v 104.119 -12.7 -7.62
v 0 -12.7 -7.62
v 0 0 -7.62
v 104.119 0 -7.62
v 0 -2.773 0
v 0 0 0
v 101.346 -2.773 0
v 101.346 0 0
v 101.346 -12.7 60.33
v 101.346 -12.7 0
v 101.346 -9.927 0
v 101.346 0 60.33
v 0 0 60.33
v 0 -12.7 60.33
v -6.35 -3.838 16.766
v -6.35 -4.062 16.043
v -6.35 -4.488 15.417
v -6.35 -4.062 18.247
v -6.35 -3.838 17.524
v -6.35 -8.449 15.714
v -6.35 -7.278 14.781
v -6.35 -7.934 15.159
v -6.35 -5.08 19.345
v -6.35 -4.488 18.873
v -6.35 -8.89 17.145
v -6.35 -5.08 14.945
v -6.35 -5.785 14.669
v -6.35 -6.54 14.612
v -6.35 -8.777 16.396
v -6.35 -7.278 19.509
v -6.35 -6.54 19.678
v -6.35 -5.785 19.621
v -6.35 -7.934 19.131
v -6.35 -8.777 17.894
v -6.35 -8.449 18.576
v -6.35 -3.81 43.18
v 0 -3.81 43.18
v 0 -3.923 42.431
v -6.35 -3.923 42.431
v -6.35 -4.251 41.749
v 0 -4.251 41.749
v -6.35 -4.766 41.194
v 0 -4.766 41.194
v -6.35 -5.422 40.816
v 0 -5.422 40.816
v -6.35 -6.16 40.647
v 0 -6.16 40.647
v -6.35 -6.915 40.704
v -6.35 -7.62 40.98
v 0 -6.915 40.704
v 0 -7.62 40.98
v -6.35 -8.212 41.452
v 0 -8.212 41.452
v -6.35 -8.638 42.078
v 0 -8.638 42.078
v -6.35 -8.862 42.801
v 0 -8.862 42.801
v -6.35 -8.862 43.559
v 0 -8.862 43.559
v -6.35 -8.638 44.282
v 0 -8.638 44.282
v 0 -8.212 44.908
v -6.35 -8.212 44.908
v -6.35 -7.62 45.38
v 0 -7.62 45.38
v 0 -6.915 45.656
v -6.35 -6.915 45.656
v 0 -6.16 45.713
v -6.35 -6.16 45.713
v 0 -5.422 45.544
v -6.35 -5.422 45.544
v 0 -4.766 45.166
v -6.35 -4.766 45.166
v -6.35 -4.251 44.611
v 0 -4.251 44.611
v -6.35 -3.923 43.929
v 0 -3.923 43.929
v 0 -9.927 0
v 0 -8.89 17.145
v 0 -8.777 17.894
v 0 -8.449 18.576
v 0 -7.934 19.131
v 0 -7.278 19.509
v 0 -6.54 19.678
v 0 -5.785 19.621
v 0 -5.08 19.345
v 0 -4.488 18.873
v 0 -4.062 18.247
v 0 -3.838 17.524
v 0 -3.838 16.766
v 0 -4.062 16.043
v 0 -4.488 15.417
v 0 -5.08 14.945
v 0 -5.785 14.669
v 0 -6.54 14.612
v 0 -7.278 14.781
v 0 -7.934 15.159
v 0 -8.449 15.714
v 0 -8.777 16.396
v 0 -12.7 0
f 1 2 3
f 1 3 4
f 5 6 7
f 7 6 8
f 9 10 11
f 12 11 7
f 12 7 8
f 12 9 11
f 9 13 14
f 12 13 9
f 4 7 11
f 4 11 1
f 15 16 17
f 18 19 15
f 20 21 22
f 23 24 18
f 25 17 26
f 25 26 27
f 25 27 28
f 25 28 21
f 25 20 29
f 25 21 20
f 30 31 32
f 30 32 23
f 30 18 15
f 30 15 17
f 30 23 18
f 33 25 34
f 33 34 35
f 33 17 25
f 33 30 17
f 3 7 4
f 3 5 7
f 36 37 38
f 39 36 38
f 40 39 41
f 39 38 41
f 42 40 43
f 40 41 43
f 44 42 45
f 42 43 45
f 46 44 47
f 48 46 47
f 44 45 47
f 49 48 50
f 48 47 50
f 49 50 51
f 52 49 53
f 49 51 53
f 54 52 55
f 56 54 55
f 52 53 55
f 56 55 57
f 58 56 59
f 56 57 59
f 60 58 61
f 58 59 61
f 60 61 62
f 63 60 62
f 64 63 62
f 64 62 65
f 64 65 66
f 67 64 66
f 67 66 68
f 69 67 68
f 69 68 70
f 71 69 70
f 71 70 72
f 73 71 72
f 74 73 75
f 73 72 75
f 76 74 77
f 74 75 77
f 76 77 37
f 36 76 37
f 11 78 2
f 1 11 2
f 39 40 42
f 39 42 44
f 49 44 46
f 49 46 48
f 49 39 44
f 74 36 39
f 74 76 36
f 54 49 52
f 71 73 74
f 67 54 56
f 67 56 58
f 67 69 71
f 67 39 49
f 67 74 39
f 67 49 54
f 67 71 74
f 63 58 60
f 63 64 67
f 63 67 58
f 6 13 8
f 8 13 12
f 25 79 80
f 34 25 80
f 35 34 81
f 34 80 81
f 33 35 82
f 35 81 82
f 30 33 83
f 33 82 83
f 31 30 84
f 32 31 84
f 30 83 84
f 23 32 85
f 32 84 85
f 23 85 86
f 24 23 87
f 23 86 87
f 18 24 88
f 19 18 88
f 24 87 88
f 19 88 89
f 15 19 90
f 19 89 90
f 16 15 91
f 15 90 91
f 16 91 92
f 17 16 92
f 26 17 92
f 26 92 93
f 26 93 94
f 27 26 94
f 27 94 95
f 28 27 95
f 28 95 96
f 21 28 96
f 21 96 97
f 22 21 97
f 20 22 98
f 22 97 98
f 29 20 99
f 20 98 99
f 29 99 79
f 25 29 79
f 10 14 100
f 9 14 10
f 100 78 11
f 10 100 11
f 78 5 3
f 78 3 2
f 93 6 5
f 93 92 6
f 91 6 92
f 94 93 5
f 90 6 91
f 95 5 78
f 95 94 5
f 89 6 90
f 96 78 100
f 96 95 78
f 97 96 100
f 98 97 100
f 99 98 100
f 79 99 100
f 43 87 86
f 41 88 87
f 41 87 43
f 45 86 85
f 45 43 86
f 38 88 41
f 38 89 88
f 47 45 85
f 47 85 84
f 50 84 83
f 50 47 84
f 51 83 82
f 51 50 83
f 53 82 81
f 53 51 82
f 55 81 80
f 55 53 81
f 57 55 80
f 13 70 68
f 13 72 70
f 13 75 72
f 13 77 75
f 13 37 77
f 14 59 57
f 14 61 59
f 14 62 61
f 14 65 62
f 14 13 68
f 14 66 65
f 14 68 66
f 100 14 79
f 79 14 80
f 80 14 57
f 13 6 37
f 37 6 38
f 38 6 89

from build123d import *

# Parameters (mm, degrees)
F0_W      = 101.6
F0_H      = 60.33
F1_DEPTH  = 12.7
F3_DEPTH  = 101.6
F4_W      = 13.7607939541
F4_H      = 10.2049419656
F5_DEPTH  = 3.175
F6_DEPTH  = 3.175
F7_W      = 0.254
F7_H      = 12.7
F8_DEPTH  = 101.6
F10_DEPTH = 25.4
F11_W     = 0.7027839153
F11_H     = 7.62
F14_W     = 24.6972160847
F14_H     = 5.7475257993
F15_DEPTH = 7.62
F17_DEPTH = 6.35


with BuildPart() as f1:
    # F0 (on Front) → F1 (new body)
    with BuildSketch(Plane.XZ):
        with Locations((50.8, 30.165)):
            Rectangle(F0_W, F0_H)
    extrude(amount=F1_DEPTH)

    # F2 (on face) → F3 (join)
    with BuildSketch(Plane.YZ.offset(101.6)):
        Polygon((0, -7.62), (-2.7734531851, 0), (-9.9265468149, 0), (-12.7, -7.62), align=None)
    extrude(amount=-F3_DEPTH)

    # F4 (on face) → F5 (cut)
    with BuildSketch(Plane(origin=(0, 0, 0), x_dir=(0, -1, 0), z_dir=(-1, 0, 0))):
        with Locations((6.8803969771, -5.1024709828)):
            Rectangle(F4_W, F4_H)
    extrude(amount=-F5_DEPTH, mode=Mode.SUBTRACT)

    # F6 (add): a face of the model
    f6_faces = [f1.faces().sort_by_distance(p)[0] for p in [
        (3.175, -6.35, -4.1648349301),
    ]]
    extrude(f6_faces, amount=F6_DEPTH)

    # F7 (on face) → F8 (cut)
    with BuildSketch(Plane.XY.offset(60.33)):
        with Locations((101.473, -6.35)):
            Rectangle(F7_W, F7_H)
    extrude(amount=-F8_DEPTH, mode=Mode.SUBTRACT)

    # F9 (on face) → F10 (cut)
    with BuildSketch(Plane.YZ.offset(101.346)):
        Polygon((-9.9265468149, 0), (-12.7, -7.62), (0, -7.62), (-2.7734531851, 0), align=None)
    extrude(amount=-F10_DEPTH, mode=Mode.SUBTRACT)

    # F13: sweep along a path in F12
    with BuildLine(Plane(origin=(0, 0, 0), x_dir=(1, 0, 0), z_dir=(0, 0, -1))) as f13_path:
        Line((75.946, 9.9265468149), (101.346, 9.9265468149))
        Line((101.346, 9.9265468149), (101.346, 2.7734531851))
        Line((101.346, 2.7734531851), (75.946, 2.7734531851))
    # F11 (on face) → F13 (sweep)
    with BuildSketch(Plane.YZ.offset(75.946)):
        Polygon((-9.9265468149, 0), (-12.7, -7.62), (-9.9265468149, -7.62), align=None)
        with Locations((-9.5751548573, -3.81)):
            Rectangle(F11_W, F11_H)
    sweep(path=f13_path.line, transition=Transition.RIGHT)

    # F14 (on face) → F15 (join)
    with BuildSketch(Plane(origin=(0, 0, -7.62), x_dir=(1, 0, 0), z_dir=(0, 0, -1))):
        with Locations((88.2946080424, 6.35)):
            Rectangle(F14_W, F14_H)
    extrude(amount=-F15_DEPTH)

    # F16 (on face) → F17 (join)
    with BuildSketch(Plane(origin=(0, 0, 0), x_dir=(0, -1, 0), z_dir=(-1, 0, 0))):
        with BuildLine():
            ThreePointArc((8.89, 43.18), (6.35, 45.72), (3.81, 43.18))
            Line((3.81, 43.18), (8.89, 43.18))
        make_face()
        with BuildLine():
            Line((8.89, 43.18), (3.81, 43.18))
            ThreePointArc((3.81, 43.18), (6.35, 40.64), (8.89, 43.18))
        make_face()
        with BuildLine():
            Line((8.89, 17.145), (3.81, 17.145))
            ThreePointArc((3.81, 17.145), (6.35, 14.605), (8.89, 17.145))
        make_face()
        with BuildLine():
            ThreePointArc((8.89, 17.145), (6.35, 19.685), (3.81, 17.145))
            Line((3.81, 17.145), (8.89, 17.145))
        make_face()
    extrude(amount=F17_DEPTH)


solid = f1.part
